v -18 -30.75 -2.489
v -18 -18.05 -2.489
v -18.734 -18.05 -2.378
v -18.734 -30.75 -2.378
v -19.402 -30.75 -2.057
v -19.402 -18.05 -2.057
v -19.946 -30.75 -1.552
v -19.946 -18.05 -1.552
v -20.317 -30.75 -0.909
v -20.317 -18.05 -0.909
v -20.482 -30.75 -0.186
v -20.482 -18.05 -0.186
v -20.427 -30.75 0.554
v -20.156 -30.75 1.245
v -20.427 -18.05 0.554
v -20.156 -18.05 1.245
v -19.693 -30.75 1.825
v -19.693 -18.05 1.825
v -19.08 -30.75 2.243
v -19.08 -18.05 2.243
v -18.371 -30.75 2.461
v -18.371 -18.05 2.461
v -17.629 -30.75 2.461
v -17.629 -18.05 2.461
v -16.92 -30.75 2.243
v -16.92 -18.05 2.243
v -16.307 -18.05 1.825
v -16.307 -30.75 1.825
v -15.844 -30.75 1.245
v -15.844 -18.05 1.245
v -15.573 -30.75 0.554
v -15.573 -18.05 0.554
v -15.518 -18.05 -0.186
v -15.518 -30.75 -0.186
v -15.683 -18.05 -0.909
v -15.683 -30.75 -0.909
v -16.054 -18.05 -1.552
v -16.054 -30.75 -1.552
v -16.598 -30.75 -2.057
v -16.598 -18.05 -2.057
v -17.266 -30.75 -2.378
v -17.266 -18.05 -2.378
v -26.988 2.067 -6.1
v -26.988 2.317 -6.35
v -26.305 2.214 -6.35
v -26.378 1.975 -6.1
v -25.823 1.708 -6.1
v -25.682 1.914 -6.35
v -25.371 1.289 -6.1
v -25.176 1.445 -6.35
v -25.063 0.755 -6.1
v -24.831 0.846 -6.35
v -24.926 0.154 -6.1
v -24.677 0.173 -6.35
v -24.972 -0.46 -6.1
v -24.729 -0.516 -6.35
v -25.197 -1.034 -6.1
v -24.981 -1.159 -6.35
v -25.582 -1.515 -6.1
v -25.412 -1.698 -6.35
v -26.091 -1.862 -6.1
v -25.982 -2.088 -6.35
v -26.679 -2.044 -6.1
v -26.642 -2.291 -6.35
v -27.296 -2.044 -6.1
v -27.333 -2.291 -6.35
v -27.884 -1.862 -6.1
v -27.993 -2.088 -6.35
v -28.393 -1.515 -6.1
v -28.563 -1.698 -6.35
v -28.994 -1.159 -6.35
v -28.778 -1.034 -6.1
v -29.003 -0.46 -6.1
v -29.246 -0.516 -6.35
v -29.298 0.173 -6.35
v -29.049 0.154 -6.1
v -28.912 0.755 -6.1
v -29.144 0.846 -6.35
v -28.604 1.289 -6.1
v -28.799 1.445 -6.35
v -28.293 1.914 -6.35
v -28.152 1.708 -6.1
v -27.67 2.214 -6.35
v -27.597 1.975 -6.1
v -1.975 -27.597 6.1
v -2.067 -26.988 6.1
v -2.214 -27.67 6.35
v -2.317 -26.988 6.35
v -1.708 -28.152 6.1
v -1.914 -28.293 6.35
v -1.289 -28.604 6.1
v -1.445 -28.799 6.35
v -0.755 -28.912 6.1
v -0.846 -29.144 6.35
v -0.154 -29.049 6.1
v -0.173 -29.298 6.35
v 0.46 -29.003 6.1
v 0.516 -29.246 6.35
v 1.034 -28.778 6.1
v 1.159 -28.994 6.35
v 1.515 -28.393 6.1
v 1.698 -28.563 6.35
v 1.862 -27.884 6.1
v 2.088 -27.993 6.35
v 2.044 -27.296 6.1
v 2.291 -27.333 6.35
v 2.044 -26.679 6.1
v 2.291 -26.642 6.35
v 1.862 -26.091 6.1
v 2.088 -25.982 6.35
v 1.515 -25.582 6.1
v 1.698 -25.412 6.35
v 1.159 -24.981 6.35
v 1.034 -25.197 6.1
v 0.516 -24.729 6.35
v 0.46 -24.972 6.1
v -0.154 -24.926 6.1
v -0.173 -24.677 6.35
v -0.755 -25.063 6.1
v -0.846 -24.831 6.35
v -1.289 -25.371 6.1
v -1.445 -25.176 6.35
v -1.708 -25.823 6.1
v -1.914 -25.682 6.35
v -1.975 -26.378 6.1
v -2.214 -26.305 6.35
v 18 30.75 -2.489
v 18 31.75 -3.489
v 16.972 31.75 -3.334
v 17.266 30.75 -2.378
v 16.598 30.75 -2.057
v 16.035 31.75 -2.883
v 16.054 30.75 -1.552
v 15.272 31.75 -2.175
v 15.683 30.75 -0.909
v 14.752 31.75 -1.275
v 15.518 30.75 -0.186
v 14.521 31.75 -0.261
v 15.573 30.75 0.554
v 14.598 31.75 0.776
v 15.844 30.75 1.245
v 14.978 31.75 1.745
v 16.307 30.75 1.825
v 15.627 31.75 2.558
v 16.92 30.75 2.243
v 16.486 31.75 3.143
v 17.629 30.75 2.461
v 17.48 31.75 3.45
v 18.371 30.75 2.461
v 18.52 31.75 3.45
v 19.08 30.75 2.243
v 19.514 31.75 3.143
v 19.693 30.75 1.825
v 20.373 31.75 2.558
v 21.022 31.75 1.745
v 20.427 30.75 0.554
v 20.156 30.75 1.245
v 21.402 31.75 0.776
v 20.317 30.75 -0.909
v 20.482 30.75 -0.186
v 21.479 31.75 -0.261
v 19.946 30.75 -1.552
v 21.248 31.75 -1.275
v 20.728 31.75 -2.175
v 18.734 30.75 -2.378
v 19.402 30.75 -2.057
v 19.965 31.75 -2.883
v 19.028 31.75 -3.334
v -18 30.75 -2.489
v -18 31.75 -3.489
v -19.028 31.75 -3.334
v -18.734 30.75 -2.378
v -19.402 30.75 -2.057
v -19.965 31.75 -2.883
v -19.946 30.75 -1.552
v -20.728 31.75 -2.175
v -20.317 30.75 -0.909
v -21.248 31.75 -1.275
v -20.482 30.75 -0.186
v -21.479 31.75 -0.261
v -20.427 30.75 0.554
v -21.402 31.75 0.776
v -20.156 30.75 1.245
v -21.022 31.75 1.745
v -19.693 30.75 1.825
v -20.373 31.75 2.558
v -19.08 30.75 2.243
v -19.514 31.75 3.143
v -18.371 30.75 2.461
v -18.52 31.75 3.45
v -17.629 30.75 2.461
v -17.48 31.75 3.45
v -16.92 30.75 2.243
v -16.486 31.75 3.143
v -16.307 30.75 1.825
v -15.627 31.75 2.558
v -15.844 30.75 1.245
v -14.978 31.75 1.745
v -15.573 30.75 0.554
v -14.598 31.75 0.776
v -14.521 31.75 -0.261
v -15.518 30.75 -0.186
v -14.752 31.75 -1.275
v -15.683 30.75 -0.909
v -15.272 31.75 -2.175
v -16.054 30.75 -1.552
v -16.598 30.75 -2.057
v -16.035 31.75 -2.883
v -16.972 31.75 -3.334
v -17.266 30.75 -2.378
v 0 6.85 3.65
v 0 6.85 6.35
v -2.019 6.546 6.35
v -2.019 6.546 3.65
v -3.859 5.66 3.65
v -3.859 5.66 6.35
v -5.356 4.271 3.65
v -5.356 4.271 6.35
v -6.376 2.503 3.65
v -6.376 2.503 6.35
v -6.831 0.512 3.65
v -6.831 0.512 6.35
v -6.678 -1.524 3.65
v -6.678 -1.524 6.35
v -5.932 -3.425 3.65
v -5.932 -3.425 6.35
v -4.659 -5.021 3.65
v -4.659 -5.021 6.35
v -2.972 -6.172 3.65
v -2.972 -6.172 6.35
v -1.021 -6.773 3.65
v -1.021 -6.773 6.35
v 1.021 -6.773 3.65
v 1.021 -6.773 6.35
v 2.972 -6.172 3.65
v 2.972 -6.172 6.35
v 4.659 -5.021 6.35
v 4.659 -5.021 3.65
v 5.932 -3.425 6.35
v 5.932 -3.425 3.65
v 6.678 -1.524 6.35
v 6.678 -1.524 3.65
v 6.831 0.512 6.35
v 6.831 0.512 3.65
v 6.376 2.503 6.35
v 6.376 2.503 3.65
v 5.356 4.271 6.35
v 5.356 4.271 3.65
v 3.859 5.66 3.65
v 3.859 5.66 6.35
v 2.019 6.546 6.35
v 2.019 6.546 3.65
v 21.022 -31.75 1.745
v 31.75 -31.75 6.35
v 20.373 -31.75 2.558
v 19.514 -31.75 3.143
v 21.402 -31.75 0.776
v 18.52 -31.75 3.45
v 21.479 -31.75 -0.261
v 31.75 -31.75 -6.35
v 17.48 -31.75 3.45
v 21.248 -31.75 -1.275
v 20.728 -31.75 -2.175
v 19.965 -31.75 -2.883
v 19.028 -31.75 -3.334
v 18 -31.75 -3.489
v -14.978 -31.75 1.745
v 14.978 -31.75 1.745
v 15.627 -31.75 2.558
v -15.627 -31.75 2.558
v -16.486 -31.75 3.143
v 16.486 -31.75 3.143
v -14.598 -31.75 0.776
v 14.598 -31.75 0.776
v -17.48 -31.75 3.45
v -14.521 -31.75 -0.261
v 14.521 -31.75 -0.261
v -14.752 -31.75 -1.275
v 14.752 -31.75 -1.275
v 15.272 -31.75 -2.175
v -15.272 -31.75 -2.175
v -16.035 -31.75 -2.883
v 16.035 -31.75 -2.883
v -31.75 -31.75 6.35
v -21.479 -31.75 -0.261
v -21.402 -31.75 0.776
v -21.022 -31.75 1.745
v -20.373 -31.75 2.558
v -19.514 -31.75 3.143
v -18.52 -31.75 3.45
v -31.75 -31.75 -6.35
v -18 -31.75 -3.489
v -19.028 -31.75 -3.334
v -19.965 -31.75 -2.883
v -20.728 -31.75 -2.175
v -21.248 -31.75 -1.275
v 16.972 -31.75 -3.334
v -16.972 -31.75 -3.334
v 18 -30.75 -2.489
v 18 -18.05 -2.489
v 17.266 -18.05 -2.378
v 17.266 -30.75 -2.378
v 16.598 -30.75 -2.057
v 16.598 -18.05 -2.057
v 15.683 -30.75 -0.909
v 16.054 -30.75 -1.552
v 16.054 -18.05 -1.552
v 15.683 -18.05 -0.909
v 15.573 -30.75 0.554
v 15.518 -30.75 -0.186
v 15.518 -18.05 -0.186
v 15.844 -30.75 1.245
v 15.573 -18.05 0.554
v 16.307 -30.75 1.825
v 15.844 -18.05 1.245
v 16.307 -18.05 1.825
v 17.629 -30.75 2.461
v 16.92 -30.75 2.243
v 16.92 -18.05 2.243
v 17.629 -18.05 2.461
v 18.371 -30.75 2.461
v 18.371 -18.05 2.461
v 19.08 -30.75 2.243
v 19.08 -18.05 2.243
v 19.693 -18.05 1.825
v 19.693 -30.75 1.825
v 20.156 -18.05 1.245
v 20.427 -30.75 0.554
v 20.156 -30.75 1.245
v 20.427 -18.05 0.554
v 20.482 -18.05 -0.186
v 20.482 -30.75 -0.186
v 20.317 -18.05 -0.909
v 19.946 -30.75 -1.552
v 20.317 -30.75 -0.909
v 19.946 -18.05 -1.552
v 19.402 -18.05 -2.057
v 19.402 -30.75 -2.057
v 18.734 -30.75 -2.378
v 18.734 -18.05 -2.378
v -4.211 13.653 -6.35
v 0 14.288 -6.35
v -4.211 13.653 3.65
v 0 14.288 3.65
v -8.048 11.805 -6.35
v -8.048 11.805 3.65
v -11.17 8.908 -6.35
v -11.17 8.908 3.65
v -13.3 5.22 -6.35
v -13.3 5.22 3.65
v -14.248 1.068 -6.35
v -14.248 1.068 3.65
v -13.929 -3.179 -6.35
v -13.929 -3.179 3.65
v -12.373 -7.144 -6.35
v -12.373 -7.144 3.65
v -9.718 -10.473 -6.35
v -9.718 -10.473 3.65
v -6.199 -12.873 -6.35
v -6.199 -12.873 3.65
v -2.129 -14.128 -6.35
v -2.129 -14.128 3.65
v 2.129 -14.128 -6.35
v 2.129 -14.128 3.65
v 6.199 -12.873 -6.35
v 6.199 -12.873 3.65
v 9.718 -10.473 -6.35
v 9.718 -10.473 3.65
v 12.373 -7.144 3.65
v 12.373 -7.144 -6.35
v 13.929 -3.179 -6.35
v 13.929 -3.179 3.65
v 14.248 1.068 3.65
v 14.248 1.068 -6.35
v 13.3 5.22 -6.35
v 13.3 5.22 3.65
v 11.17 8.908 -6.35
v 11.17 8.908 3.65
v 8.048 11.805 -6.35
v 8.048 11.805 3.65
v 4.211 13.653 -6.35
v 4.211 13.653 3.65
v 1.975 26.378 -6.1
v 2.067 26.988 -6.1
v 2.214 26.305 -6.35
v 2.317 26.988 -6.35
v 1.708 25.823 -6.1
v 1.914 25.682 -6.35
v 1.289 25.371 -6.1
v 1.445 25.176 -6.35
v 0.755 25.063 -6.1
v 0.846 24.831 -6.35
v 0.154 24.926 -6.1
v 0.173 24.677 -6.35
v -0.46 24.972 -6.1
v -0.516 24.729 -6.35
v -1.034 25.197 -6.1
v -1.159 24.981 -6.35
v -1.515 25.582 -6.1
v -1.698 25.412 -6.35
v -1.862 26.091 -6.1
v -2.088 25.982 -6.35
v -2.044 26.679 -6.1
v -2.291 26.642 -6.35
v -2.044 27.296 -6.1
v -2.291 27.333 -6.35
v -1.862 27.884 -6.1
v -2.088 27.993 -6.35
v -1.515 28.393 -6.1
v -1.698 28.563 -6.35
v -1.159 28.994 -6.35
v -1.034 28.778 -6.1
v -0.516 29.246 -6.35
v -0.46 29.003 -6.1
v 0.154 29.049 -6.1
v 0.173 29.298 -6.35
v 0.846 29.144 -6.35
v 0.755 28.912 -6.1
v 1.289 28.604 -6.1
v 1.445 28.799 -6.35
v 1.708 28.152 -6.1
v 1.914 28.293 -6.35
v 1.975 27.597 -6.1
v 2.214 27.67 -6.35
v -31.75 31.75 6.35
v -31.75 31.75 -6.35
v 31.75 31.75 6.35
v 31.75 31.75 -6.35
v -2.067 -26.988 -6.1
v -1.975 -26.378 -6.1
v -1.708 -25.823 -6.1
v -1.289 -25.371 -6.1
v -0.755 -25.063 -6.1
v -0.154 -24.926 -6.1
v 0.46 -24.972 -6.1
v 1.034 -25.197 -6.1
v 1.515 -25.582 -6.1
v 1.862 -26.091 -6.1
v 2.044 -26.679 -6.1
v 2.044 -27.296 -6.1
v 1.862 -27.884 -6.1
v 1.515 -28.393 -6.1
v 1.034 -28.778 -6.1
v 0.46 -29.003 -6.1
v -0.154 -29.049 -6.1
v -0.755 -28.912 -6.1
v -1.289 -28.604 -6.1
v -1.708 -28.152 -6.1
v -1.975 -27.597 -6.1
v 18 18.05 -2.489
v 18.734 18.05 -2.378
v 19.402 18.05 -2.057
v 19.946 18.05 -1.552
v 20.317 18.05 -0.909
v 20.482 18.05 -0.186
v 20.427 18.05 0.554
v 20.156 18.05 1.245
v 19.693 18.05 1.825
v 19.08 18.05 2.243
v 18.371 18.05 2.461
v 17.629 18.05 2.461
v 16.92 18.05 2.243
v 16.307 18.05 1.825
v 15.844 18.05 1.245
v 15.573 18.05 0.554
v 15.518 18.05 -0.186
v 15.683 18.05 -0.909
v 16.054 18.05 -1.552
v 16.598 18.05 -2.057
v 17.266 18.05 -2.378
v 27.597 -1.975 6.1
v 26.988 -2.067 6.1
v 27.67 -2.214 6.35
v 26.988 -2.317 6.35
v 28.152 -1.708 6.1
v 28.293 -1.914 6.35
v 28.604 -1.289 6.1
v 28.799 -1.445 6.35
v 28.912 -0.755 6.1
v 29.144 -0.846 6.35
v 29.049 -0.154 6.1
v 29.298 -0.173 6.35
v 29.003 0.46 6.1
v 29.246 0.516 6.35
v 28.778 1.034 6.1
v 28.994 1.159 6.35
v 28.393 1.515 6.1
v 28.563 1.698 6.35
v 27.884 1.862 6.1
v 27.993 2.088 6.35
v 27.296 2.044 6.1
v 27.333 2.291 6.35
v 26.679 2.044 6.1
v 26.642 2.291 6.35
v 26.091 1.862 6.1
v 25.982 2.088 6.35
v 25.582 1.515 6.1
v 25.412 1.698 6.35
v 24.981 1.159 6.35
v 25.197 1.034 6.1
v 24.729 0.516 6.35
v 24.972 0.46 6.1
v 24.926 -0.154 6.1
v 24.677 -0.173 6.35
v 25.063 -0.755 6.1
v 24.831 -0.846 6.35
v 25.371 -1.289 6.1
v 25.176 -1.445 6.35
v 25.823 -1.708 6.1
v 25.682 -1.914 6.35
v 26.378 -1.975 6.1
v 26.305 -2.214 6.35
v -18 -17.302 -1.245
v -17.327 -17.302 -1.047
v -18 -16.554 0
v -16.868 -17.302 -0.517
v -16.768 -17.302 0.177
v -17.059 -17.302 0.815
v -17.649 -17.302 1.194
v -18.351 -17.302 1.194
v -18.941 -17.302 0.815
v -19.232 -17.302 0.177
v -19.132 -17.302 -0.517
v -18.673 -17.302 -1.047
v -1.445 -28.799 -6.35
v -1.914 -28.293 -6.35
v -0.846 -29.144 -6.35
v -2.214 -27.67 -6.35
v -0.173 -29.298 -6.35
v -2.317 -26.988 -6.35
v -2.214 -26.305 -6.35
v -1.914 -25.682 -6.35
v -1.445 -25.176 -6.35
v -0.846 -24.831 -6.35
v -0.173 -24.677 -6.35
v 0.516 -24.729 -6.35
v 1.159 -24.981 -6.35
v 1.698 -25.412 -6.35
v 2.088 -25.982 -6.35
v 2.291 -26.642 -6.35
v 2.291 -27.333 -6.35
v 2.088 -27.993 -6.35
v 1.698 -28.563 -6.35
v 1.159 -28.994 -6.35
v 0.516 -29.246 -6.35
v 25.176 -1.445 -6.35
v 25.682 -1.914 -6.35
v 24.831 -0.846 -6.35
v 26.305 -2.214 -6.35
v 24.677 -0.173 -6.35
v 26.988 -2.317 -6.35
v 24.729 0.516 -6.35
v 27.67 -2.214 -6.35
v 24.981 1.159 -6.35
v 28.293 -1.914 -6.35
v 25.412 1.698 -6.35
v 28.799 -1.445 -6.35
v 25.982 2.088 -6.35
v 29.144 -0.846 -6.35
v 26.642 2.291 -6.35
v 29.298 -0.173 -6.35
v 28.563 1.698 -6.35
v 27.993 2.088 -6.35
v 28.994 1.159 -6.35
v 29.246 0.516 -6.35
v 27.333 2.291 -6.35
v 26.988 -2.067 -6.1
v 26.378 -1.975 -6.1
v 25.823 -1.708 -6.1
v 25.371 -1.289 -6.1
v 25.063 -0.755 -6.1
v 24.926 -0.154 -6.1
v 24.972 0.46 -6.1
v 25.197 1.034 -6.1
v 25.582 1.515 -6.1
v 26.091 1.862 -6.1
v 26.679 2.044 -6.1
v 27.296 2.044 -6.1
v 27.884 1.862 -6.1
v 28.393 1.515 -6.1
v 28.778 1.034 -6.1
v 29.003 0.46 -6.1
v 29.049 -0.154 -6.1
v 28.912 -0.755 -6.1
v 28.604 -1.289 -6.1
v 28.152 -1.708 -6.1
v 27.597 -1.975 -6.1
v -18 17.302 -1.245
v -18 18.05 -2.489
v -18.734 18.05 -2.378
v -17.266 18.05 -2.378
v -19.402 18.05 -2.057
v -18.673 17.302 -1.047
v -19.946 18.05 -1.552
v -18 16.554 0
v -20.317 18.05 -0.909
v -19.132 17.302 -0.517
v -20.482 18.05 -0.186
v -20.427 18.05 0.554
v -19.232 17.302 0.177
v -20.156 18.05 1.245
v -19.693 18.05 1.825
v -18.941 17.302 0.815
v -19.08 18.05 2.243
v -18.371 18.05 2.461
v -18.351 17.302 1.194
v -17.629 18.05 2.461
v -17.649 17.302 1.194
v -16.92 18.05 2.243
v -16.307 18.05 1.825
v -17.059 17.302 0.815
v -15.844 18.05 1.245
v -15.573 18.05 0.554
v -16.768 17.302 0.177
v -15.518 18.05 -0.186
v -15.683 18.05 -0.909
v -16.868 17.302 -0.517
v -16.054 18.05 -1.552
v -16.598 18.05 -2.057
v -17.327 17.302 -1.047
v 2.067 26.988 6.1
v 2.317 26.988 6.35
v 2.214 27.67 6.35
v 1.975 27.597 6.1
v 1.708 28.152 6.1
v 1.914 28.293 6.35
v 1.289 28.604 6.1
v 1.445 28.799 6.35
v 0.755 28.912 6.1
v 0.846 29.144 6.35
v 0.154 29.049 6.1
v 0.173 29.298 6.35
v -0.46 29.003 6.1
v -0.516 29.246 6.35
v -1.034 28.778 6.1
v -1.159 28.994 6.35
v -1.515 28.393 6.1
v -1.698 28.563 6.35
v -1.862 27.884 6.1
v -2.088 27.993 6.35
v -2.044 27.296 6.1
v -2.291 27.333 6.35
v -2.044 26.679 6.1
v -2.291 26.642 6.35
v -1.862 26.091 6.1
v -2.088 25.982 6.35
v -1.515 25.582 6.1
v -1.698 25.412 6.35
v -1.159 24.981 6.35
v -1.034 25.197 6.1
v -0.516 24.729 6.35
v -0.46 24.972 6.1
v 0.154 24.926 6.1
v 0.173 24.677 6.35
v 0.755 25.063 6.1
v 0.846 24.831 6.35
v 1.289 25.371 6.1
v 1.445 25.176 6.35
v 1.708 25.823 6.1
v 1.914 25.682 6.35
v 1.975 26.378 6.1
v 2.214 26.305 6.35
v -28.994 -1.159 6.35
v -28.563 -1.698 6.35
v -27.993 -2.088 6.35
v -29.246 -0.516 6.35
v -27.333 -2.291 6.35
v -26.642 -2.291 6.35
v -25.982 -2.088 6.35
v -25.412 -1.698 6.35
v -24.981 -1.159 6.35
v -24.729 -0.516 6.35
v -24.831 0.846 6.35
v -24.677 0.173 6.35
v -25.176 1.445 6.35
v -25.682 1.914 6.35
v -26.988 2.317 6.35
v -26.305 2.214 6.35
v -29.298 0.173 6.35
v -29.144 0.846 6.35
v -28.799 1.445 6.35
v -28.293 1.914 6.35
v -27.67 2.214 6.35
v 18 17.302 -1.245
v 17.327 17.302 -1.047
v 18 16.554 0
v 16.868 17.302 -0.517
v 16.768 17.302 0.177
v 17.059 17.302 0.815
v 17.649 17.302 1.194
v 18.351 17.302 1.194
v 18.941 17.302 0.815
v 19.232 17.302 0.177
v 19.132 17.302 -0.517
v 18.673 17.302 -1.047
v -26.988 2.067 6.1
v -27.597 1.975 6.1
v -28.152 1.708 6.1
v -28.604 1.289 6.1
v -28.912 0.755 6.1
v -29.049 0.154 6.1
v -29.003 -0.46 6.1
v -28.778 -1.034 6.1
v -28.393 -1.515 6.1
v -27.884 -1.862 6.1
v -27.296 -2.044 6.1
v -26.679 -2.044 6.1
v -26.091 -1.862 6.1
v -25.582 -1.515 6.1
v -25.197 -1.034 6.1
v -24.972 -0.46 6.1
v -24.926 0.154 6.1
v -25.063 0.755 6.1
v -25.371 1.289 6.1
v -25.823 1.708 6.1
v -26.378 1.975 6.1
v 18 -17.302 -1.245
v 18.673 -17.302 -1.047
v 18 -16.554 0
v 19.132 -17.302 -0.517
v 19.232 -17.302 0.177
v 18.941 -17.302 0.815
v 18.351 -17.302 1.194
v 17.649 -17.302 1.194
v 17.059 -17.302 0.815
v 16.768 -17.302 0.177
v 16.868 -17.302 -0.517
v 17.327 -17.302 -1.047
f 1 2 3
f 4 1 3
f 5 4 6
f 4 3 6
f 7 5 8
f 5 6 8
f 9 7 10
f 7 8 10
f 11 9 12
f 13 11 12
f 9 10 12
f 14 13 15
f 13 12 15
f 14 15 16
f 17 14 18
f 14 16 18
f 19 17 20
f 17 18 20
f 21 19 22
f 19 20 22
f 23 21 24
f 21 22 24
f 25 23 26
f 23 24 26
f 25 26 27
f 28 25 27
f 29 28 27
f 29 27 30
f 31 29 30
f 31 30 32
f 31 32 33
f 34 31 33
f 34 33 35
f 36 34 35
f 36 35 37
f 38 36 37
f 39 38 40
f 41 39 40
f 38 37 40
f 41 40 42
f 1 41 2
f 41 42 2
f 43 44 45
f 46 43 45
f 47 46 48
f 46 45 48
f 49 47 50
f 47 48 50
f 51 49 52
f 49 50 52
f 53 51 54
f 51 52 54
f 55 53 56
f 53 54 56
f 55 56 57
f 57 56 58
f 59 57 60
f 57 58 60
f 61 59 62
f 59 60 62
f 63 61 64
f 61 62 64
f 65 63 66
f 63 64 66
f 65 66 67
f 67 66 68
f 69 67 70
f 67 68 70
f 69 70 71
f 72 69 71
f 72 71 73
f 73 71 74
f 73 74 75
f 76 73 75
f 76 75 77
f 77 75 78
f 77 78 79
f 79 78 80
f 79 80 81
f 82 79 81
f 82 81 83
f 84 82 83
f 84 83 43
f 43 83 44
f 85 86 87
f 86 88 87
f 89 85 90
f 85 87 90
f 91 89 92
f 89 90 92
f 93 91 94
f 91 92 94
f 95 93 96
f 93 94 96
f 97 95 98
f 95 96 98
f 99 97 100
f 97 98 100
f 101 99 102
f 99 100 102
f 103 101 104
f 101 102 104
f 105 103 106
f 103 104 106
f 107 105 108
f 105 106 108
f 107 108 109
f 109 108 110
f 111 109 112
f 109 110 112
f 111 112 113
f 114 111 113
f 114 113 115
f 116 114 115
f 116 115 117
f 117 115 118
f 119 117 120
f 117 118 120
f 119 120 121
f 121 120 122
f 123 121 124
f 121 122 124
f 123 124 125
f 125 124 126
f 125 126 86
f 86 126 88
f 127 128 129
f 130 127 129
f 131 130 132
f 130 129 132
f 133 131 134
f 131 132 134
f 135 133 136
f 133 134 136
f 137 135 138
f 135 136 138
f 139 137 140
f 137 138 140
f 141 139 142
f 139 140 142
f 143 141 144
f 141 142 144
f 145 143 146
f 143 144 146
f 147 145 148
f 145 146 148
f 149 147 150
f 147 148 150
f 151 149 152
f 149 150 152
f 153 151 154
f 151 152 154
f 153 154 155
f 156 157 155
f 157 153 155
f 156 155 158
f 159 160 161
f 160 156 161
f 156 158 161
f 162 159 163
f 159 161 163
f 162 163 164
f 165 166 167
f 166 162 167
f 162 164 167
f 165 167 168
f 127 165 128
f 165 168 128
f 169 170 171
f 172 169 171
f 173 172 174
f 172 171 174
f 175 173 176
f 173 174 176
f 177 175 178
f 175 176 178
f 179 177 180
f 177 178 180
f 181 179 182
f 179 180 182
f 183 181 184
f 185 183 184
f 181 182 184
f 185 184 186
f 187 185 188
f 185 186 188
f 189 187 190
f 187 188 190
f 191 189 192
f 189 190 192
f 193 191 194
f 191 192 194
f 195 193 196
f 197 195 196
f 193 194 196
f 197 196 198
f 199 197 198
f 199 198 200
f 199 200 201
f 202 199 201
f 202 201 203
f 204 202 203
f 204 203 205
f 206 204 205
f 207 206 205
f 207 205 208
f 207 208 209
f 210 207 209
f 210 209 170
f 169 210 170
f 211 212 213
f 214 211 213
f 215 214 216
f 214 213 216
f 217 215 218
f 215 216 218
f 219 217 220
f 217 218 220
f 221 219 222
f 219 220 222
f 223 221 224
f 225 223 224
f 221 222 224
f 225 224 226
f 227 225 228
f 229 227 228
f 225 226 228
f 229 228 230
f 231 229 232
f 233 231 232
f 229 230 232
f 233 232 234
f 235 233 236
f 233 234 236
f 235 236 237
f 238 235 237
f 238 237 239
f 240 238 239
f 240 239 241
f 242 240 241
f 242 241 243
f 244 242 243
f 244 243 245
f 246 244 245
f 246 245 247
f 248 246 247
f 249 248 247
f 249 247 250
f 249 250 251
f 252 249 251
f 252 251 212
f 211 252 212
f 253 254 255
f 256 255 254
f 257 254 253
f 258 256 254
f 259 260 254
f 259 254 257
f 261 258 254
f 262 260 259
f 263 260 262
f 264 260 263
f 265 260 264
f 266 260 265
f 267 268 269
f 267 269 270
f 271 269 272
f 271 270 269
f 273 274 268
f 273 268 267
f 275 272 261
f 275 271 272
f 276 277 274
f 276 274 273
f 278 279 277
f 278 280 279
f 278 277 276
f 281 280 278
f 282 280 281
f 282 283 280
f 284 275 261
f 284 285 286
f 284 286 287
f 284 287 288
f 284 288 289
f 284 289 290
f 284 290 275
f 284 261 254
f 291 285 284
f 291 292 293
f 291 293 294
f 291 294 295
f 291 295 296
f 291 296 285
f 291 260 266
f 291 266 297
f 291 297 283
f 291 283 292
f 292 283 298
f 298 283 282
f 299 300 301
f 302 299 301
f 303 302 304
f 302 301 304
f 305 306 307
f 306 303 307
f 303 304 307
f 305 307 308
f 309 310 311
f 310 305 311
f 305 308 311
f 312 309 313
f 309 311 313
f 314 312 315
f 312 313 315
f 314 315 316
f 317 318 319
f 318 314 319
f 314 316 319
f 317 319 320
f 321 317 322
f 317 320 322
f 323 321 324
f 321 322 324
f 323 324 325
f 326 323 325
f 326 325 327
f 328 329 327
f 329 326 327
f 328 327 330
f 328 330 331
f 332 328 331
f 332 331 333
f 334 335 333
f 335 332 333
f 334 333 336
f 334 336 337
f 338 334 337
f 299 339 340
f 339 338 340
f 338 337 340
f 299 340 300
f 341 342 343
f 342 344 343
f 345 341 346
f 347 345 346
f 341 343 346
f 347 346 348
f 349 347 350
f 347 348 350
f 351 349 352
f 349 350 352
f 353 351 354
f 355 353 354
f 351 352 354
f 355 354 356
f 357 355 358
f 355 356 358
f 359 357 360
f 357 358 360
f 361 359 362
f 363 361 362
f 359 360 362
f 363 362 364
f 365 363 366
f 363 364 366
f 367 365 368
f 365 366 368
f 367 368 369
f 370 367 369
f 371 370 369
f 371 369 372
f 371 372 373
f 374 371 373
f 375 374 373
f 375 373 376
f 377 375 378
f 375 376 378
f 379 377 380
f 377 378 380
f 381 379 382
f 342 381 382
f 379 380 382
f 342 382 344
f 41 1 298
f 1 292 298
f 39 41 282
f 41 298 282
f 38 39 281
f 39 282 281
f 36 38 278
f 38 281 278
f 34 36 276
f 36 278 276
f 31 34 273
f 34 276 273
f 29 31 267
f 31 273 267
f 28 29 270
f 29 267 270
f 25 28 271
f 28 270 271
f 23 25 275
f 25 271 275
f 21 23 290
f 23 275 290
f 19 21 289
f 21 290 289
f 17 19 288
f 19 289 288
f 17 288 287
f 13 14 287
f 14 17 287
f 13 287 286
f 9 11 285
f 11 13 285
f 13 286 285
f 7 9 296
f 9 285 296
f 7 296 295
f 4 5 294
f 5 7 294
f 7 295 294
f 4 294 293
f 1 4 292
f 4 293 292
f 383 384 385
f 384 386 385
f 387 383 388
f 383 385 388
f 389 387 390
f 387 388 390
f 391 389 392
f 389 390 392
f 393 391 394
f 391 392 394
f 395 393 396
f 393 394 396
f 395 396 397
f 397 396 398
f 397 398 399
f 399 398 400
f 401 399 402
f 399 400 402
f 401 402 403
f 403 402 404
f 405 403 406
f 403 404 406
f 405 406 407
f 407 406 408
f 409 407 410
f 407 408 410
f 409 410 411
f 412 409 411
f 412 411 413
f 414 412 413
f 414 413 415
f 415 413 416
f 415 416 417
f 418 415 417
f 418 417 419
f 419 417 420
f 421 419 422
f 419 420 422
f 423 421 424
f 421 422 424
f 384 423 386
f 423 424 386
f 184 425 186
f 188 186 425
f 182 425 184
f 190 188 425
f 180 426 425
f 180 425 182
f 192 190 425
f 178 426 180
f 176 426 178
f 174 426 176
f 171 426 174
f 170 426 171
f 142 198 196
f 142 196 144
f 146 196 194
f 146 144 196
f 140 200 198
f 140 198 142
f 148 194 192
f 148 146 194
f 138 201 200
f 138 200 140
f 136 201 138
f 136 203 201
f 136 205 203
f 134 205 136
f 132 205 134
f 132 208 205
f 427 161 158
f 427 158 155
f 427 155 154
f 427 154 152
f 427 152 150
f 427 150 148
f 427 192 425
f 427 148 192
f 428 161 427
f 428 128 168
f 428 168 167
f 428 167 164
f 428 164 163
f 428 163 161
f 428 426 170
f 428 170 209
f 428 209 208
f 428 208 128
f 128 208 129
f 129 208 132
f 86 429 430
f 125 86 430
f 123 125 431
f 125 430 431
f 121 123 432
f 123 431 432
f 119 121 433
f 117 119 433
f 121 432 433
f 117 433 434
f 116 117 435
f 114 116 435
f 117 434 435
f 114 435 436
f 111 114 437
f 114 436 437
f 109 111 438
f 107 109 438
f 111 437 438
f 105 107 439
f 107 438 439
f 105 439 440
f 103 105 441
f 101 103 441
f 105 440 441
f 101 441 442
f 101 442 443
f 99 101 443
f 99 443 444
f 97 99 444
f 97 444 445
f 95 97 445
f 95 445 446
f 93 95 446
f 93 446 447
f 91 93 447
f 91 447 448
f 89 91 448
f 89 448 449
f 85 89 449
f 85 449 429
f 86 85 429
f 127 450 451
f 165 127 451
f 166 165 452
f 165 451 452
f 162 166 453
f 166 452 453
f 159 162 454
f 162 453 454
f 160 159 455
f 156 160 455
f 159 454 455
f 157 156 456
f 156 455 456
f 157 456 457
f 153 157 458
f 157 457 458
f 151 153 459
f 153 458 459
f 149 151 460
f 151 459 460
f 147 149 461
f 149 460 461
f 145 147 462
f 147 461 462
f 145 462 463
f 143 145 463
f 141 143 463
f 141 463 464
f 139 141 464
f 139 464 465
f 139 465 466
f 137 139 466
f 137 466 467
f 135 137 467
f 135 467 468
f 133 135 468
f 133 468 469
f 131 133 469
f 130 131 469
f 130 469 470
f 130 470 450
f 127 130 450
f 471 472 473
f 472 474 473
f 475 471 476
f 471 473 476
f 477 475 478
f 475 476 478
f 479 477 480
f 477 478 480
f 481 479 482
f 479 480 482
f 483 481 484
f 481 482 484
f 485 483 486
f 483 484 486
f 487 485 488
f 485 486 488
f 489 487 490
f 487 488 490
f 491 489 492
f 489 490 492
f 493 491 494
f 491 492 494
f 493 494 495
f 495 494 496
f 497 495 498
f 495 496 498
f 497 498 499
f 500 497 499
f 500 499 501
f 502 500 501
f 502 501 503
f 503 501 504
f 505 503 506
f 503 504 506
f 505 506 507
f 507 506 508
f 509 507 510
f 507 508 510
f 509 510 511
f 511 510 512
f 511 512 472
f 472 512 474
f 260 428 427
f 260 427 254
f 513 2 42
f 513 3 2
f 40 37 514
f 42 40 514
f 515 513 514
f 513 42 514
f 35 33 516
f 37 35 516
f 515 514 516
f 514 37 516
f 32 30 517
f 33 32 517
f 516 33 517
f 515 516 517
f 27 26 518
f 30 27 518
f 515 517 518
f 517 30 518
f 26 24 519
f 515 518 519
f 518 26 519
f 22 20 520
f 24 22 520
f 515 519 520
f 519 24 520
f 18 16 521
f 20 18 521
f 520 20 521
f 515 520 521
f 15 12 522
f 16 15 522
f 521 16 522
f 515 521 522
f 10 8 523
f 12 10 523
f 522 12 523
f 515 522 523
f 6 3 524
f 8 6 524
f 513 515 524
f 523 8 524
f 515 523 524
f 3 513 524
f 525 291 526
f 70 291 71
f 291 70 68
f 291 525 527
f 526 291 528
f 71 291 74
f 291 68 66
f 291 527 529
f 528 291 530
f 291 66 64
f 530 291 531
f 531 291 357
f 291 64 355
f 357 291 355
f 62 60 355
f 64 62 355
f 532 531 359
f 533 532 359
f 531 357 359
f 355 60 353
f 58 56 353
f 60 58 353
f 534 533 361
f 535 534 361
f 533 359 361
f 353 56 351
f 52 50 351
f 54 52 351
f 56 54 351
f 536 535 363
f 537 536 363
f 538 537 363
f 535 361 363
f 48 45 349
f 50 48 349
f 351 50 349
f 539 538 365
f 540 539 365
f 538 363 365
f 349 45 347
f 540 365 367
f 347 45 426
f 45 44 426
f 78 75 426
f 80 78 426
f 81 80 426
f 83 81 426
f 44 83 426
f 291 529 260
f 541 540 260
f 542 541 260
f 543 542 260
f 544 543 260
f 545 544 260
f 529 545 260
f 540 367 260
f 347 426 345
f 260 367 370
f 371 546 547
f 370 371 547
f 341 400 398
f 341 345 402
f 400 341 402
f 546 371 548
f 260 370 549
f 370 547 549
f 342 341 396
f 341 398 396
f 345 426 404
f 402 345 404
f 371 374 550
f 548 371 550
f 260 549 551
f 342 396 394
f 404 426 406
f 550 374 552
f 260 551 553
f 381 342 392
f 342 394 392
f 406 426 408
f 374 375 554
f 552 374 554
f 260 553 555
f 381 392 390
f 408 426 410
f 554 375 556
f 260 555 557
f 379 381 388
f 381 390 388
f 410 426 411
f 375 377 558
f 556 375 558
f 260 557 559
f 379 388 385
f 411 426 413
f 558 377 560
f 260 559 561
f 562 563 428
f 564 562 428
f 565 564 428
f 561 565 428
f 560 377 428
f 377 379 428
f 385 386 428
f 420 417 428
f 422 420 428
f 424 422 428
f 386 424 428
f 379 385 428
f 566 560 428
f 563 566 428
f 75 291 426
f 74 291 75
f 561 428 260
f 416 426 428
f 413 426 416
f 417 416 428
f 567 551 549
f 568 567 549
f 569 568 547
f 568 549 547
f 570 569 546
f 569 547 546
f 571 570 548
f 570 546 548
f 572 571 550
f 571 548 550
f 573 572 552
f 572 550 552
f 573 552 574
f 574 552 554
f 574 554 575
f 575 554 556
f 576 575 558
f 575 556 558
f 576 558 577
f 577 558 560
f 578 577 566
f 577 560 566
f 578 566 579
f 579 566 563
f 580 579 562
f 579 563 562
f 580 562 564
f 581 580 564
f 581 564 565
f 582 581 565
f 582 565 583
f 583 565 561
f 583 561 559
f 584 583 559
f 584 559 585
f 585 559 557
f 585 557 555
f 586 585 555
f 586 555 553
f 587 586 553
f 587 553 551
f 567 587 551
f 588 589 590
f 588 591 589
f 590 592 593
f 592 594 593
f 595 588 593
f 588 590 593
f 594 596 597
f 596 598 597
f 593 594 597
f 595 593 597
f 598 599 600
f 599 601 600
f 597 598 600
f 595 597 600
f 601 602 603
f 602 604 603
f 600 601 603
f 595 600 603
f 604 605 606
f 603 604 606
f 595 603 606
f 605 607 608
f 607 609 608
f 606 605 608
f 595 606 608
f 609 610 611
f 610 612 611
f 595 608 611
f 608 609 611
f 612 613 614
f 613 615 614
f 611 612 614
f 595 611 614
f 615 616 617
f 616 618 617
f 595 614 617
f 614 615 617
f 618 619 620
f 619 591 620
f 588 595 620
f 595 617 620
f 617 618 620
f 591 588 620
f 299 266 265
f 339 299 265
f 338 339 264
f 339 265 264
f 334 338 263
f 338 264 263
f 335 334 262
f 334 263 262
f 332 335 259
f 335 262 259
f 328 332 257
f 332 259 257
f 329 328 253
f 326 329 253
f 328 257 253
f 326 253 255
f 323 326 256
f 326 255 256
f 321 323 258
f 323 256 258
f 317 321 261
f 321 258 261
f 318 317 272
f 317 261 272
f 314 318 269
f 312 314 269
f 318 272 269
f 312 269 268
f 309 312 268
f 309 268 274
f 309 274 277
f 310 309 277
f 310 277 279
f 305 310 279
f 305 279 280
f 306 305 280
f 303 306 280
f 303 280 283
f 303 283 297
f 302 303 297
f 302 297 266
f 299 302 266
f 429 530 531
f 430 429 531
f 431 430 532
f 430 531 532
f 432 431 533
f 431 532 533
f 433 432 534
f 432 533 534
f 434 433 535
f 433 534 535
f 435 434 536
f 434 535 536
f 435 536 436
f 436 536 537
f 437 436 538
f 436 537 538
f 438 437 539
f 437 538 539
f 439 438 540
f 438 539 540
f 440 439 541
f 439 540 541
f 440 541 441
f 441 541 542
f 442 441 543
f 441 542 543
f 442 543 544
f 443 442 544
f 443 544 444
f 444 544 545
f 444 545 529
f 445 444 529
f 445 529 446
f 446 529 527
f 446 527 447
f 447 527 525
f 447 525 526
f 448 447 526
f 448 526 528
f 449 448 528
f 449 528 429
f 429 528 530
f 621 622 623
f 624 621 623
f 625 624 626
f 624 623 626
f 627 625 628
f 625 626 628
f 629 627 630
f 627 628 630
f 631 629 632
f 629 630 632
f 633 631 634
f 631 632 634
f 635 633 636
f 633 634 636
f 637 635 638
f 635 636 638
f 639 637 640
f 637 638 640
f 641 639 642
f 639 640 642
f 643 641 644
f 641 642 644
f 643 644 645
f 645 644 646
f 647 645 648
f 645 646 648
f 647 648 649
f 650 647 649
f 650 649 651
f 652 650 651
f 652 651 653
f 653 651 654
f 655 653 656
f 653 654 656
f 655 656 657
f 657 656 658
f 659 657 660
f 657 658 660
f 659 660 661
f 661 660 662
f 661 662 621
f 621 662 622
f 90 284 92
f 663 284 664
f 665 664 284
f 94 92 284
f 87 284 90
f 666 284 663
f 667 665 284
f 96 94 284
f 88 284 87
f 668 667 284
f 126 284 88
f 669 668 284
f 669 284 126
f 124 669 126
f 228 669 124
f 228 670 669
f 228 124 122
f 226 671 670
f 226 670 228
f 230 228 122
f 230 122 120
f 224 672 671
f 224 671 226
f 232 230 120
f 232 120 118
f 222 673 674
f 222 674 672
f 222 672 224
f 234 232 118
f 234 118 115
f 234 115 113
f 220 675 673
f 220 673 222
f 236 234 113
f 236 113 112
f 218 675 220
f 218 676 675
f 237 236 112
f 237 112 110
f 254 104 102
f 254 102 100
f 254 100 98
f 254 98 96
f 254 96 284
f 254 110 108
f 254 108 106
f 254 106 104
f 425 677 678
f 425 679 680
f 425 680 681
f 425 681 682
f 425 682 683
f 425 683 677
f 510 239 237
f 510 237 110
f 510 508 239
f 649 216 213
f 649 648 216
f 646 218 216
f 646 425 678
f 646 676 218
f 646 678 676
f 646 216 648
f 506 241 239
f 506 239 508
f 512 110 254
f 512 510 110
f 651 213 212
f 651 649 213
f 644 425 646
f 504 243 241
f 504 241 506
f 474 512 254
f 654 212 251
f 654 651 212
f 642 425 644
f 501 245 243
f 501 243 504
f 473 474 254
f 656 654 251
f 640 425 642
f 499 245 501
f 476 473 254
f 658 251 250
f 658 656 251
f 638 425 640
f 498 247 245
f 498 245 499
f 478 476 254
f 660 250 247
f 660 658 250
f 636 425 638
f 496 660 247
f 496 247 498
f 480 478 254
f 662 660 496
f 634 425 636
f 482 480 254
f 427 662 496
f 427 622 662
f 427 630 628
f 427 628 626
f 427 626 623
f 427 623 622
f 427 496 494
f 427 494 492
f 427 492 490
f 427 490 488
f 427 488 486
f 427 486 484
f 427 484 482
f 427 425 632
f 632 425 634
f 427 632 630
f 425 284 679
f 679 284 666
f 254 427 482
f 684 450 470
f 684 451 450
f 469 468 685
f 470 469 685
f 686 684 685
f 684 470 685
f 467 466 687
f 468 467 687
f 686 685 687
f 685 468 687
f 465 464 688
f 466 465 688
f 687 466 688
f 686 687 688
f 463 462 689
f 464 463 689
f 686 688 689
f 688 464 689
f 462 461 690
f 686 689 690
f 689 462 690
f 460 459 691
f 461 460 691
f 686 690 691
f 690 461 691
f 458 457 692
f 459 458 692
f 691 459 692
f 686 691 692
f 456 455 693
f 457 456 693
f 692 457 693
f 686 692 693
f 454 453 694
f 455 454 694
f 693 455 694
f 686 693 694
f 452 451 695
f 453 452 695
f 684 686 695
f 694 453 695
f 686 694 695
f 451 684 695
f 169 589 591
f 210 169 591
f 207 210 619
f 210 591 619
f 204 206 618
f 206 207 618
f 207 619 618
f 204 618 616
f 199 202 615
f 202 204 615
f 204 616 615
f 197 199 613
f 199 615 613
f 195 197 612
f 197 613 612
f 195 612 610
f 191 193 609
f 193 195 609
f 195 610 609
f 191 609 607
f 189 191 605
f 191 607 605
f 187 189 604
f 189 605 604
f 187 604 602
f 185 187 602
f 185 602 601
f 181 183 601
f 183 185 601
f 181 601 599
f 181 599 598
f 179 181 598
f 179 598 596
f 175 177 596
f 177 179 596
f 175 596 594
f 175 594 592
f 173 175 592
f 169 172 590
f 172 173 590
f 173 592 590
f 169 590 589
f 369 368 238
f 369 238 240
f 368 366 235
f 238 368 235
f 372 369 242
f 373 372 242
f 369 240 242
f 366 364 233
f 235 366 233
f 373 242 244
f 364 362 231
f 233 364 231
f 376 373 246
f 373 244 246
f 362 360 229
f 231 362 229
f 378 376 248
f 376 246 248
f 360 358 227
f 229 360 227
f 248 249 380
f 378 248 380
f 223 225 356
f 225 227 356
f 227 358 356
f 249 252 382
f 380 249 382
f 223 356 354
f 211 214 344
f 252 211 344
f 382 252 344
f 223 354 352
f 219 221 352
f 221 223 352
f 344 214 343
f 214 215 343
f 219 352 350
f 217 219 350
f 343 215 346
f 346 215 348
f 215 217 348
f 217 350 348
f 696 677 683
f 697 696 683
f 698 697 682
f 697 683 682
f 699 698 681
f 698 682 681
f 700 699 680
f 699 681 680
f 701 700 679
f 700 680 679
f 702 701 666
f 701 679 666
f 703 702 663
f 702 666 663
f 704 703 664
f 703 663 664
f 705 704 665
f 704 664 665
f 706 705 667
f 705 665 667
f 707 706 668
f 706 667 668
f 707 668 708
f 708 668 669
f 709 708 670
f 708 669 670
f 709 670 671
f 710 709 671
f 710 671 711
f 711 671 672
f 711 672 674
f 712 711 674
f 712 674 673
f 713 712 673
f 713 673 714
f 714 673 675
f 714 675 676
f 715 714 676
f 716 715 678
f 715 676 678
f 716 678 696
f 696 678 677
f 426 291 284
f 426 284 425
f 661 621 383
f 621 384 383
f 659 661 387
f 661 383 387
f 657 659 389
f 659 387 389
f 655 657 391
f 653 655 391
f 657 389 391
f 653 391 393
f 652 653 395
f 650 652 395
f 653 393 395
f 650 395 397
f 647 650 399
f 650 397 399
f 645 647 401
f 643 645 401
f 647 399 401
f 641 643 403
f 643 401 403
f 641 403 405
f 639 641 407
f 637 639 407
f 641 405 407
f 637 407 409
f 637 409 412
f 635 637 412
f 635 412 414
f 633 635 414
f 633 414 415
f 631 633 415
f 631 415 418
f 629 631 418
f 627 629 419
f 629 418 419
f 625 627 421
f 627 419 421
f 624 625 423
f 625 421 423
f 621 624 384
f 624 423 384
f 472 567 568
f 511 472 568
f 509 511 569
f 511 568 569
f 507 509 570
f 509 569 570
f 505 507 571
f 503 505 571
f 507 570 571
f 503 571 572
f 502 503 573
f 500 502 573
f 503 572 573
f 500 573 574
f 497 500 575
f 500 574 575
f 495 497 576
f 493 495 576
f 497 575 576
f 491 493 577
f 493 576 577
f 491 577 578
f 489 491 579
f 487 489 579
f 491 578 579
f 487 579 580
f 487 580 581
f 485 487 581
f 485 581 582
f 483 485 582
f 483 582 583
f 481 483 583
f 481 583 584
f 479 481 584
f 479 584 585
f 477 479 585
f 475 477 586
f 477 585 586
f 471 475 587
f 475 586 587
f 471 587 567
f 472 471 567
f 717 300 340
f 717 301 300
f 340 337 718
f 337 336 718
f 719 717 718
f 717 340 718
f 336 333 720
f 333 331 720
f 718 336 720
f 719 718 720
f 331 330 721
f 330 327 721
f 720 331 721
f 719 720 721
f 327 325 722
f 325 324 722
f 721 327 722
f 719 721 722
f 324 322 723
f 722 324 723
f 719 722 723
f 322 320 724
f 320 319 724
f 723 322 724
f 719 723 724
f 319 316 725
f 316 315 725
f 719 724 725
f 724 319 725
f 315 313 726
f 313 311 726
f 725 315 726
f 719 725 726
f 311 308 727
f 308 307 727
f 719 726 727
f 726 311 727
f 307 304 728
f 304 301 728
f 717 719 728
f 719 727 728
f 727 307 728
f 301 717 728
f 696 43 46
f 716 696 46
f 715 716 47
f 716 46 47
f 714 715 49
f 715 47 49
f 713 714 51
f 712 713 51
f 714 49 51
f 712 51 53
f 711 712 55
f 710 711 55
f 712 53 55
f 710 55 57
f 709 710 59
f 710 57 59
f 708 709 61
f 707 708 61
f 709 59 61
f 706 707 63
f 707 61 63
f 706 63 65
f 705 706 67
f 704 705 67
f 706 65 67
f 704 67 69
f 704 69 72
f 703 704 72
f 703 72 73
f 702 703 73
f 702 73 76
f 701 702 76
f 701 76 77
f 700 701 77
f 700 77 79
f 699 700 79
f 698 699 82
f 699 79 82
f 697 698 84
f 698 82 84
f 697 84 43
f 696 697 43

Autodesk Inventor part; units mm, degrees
ref_plane "YZ Plane" through (0, 0, 0) normal (1, 0, 0) x (0, 1, 0)
ref_plane "XZ Plane" through (0, 0, 0) normal (0, 1, 0) x (-1, 0, 0)
ref_plane "XY Plane" through (0, 0, 0) normal (0, 0, 1) x (1, 0, 0)
sketch "Sketch1" plane through (0, 0, 0) normal (0, 0, 1) x (1, 0, 0)
  line L0 (-31.75, 31.75) -> (31.75, 31.75)
  line L1 (31.75, 31.75) -> (31.75, -31.75)
  line L2 (31.75, -31.75) -> (-31.75, -31.75)
  line L3 (-31.75, -31.75) -> (-31.75, 31.75)
  line L4 (0, 0) -> (0, 31.75) construction
  line L5 (0, 0) -> (0, -31.75) construction
  line L6 (0, 0) -> (31.75, 0) construction
  line L7 (0, 0) -> (-31.75, 0) construction
  dimension "d0" = 63.5
  dimension "d1" = 63.5
extrude "Extrusion1" add sketch "Sketch1" along normal mid plane 12.7
sketch "Sketch9" plane through (-31.75, -31.75, 6.35) normal (0, -1, 0) x (1, 0, 0)
  line L0 (63.5, 0) -> (0, 0) projected
  line L1 (0, 0) -> (0, -12.7) projected
  line L2 (0, -12.7) -> (63.5, -12.7) projected
  line L3 (63.5, 0) -> (63.5, -12.7) projected
  line L4 (0, -6.35) -> (63.5, -6.35) construction
  line L5 (31.75, 0) -> (31.75, -12.7) construction
  point P0 (13.75, -6.35)
  dimension "d37" = 18
hole "Hole3" at (-18, -31.75, 0) direction (0, 1, 0) diameter 4.978 depth 13.7 tip angle 118 thread size "1/4-20 UNC" class "1B" standard "ANSI Unified Screw Threads"
mirror "Mirror1" about plane through (0, 0, 0) normal (1, 0, 0) of "Hole3"
mirror "Mirror2" about plane through (0, 0, 0) normal (0, 1, 0) of "Hole3", "Mirror1"
chamfer "Chamfer2" distance 1 angle 45 4 edges at (-18, -31.75, 2.489) (18, -31.75, 2.489) (-18, 31.75, 2.489) (18, 31.75, 2.489)
sketch "Sketch12" plane through (0, 0, -6.35) normal (0, 0, -1) x (-1, 0, 0)
  point P0 (0, 0)
  point P1 (0, 0)
hole "Hole6" at (0, 0, -6.35) direction (0, 0, 1) diameter 13.7 end through all counterbore diameter 28.575 counterbore depth 10
sketch "Sketch11" plane through (0, 0, 6.35) normal (0, 0, 1) x (1, 0, 0)
  circle A0 centre (0, 0) radius 6.85 projected
  line L0 (31.75, 31.75) -> (31.75, -31.75) projected
  line L1 (0, 0) -> (31.75, 0) construction
  point P0 (26.9875, 0)
  dimension "d82" = 26.9875
hole "Hole5" at (26.9875, 0, 6.35) direction (0, 0, -1) diameter 4.134 end through all thread size "M5x0.8" class "6H" standard "ANSI Metric M Profile"
pattern_circular "Circular Pattern4" count 4 over 360 about axis through (0, 0, 84.3461) along (0, 0, -1) of "Hole5"
chamfer "Chamfer3" distance 0.25 angle 45 8 edges at (26.9875, 2.067, 6.35) (2.067, -26.9875, -6.35) (-26.9875, -2.067, -6.35) (-2.067, 26.9875, -6.35) (26.9875, 2.067, -6.35) (-2.067, 26.9875, 6.35) (-26.9875, -2.067, 6.35) (2.067, -26.9875, 6.35)
properties part number "BB2-FrontPlate" material "Aluminum-6061-AHC"
